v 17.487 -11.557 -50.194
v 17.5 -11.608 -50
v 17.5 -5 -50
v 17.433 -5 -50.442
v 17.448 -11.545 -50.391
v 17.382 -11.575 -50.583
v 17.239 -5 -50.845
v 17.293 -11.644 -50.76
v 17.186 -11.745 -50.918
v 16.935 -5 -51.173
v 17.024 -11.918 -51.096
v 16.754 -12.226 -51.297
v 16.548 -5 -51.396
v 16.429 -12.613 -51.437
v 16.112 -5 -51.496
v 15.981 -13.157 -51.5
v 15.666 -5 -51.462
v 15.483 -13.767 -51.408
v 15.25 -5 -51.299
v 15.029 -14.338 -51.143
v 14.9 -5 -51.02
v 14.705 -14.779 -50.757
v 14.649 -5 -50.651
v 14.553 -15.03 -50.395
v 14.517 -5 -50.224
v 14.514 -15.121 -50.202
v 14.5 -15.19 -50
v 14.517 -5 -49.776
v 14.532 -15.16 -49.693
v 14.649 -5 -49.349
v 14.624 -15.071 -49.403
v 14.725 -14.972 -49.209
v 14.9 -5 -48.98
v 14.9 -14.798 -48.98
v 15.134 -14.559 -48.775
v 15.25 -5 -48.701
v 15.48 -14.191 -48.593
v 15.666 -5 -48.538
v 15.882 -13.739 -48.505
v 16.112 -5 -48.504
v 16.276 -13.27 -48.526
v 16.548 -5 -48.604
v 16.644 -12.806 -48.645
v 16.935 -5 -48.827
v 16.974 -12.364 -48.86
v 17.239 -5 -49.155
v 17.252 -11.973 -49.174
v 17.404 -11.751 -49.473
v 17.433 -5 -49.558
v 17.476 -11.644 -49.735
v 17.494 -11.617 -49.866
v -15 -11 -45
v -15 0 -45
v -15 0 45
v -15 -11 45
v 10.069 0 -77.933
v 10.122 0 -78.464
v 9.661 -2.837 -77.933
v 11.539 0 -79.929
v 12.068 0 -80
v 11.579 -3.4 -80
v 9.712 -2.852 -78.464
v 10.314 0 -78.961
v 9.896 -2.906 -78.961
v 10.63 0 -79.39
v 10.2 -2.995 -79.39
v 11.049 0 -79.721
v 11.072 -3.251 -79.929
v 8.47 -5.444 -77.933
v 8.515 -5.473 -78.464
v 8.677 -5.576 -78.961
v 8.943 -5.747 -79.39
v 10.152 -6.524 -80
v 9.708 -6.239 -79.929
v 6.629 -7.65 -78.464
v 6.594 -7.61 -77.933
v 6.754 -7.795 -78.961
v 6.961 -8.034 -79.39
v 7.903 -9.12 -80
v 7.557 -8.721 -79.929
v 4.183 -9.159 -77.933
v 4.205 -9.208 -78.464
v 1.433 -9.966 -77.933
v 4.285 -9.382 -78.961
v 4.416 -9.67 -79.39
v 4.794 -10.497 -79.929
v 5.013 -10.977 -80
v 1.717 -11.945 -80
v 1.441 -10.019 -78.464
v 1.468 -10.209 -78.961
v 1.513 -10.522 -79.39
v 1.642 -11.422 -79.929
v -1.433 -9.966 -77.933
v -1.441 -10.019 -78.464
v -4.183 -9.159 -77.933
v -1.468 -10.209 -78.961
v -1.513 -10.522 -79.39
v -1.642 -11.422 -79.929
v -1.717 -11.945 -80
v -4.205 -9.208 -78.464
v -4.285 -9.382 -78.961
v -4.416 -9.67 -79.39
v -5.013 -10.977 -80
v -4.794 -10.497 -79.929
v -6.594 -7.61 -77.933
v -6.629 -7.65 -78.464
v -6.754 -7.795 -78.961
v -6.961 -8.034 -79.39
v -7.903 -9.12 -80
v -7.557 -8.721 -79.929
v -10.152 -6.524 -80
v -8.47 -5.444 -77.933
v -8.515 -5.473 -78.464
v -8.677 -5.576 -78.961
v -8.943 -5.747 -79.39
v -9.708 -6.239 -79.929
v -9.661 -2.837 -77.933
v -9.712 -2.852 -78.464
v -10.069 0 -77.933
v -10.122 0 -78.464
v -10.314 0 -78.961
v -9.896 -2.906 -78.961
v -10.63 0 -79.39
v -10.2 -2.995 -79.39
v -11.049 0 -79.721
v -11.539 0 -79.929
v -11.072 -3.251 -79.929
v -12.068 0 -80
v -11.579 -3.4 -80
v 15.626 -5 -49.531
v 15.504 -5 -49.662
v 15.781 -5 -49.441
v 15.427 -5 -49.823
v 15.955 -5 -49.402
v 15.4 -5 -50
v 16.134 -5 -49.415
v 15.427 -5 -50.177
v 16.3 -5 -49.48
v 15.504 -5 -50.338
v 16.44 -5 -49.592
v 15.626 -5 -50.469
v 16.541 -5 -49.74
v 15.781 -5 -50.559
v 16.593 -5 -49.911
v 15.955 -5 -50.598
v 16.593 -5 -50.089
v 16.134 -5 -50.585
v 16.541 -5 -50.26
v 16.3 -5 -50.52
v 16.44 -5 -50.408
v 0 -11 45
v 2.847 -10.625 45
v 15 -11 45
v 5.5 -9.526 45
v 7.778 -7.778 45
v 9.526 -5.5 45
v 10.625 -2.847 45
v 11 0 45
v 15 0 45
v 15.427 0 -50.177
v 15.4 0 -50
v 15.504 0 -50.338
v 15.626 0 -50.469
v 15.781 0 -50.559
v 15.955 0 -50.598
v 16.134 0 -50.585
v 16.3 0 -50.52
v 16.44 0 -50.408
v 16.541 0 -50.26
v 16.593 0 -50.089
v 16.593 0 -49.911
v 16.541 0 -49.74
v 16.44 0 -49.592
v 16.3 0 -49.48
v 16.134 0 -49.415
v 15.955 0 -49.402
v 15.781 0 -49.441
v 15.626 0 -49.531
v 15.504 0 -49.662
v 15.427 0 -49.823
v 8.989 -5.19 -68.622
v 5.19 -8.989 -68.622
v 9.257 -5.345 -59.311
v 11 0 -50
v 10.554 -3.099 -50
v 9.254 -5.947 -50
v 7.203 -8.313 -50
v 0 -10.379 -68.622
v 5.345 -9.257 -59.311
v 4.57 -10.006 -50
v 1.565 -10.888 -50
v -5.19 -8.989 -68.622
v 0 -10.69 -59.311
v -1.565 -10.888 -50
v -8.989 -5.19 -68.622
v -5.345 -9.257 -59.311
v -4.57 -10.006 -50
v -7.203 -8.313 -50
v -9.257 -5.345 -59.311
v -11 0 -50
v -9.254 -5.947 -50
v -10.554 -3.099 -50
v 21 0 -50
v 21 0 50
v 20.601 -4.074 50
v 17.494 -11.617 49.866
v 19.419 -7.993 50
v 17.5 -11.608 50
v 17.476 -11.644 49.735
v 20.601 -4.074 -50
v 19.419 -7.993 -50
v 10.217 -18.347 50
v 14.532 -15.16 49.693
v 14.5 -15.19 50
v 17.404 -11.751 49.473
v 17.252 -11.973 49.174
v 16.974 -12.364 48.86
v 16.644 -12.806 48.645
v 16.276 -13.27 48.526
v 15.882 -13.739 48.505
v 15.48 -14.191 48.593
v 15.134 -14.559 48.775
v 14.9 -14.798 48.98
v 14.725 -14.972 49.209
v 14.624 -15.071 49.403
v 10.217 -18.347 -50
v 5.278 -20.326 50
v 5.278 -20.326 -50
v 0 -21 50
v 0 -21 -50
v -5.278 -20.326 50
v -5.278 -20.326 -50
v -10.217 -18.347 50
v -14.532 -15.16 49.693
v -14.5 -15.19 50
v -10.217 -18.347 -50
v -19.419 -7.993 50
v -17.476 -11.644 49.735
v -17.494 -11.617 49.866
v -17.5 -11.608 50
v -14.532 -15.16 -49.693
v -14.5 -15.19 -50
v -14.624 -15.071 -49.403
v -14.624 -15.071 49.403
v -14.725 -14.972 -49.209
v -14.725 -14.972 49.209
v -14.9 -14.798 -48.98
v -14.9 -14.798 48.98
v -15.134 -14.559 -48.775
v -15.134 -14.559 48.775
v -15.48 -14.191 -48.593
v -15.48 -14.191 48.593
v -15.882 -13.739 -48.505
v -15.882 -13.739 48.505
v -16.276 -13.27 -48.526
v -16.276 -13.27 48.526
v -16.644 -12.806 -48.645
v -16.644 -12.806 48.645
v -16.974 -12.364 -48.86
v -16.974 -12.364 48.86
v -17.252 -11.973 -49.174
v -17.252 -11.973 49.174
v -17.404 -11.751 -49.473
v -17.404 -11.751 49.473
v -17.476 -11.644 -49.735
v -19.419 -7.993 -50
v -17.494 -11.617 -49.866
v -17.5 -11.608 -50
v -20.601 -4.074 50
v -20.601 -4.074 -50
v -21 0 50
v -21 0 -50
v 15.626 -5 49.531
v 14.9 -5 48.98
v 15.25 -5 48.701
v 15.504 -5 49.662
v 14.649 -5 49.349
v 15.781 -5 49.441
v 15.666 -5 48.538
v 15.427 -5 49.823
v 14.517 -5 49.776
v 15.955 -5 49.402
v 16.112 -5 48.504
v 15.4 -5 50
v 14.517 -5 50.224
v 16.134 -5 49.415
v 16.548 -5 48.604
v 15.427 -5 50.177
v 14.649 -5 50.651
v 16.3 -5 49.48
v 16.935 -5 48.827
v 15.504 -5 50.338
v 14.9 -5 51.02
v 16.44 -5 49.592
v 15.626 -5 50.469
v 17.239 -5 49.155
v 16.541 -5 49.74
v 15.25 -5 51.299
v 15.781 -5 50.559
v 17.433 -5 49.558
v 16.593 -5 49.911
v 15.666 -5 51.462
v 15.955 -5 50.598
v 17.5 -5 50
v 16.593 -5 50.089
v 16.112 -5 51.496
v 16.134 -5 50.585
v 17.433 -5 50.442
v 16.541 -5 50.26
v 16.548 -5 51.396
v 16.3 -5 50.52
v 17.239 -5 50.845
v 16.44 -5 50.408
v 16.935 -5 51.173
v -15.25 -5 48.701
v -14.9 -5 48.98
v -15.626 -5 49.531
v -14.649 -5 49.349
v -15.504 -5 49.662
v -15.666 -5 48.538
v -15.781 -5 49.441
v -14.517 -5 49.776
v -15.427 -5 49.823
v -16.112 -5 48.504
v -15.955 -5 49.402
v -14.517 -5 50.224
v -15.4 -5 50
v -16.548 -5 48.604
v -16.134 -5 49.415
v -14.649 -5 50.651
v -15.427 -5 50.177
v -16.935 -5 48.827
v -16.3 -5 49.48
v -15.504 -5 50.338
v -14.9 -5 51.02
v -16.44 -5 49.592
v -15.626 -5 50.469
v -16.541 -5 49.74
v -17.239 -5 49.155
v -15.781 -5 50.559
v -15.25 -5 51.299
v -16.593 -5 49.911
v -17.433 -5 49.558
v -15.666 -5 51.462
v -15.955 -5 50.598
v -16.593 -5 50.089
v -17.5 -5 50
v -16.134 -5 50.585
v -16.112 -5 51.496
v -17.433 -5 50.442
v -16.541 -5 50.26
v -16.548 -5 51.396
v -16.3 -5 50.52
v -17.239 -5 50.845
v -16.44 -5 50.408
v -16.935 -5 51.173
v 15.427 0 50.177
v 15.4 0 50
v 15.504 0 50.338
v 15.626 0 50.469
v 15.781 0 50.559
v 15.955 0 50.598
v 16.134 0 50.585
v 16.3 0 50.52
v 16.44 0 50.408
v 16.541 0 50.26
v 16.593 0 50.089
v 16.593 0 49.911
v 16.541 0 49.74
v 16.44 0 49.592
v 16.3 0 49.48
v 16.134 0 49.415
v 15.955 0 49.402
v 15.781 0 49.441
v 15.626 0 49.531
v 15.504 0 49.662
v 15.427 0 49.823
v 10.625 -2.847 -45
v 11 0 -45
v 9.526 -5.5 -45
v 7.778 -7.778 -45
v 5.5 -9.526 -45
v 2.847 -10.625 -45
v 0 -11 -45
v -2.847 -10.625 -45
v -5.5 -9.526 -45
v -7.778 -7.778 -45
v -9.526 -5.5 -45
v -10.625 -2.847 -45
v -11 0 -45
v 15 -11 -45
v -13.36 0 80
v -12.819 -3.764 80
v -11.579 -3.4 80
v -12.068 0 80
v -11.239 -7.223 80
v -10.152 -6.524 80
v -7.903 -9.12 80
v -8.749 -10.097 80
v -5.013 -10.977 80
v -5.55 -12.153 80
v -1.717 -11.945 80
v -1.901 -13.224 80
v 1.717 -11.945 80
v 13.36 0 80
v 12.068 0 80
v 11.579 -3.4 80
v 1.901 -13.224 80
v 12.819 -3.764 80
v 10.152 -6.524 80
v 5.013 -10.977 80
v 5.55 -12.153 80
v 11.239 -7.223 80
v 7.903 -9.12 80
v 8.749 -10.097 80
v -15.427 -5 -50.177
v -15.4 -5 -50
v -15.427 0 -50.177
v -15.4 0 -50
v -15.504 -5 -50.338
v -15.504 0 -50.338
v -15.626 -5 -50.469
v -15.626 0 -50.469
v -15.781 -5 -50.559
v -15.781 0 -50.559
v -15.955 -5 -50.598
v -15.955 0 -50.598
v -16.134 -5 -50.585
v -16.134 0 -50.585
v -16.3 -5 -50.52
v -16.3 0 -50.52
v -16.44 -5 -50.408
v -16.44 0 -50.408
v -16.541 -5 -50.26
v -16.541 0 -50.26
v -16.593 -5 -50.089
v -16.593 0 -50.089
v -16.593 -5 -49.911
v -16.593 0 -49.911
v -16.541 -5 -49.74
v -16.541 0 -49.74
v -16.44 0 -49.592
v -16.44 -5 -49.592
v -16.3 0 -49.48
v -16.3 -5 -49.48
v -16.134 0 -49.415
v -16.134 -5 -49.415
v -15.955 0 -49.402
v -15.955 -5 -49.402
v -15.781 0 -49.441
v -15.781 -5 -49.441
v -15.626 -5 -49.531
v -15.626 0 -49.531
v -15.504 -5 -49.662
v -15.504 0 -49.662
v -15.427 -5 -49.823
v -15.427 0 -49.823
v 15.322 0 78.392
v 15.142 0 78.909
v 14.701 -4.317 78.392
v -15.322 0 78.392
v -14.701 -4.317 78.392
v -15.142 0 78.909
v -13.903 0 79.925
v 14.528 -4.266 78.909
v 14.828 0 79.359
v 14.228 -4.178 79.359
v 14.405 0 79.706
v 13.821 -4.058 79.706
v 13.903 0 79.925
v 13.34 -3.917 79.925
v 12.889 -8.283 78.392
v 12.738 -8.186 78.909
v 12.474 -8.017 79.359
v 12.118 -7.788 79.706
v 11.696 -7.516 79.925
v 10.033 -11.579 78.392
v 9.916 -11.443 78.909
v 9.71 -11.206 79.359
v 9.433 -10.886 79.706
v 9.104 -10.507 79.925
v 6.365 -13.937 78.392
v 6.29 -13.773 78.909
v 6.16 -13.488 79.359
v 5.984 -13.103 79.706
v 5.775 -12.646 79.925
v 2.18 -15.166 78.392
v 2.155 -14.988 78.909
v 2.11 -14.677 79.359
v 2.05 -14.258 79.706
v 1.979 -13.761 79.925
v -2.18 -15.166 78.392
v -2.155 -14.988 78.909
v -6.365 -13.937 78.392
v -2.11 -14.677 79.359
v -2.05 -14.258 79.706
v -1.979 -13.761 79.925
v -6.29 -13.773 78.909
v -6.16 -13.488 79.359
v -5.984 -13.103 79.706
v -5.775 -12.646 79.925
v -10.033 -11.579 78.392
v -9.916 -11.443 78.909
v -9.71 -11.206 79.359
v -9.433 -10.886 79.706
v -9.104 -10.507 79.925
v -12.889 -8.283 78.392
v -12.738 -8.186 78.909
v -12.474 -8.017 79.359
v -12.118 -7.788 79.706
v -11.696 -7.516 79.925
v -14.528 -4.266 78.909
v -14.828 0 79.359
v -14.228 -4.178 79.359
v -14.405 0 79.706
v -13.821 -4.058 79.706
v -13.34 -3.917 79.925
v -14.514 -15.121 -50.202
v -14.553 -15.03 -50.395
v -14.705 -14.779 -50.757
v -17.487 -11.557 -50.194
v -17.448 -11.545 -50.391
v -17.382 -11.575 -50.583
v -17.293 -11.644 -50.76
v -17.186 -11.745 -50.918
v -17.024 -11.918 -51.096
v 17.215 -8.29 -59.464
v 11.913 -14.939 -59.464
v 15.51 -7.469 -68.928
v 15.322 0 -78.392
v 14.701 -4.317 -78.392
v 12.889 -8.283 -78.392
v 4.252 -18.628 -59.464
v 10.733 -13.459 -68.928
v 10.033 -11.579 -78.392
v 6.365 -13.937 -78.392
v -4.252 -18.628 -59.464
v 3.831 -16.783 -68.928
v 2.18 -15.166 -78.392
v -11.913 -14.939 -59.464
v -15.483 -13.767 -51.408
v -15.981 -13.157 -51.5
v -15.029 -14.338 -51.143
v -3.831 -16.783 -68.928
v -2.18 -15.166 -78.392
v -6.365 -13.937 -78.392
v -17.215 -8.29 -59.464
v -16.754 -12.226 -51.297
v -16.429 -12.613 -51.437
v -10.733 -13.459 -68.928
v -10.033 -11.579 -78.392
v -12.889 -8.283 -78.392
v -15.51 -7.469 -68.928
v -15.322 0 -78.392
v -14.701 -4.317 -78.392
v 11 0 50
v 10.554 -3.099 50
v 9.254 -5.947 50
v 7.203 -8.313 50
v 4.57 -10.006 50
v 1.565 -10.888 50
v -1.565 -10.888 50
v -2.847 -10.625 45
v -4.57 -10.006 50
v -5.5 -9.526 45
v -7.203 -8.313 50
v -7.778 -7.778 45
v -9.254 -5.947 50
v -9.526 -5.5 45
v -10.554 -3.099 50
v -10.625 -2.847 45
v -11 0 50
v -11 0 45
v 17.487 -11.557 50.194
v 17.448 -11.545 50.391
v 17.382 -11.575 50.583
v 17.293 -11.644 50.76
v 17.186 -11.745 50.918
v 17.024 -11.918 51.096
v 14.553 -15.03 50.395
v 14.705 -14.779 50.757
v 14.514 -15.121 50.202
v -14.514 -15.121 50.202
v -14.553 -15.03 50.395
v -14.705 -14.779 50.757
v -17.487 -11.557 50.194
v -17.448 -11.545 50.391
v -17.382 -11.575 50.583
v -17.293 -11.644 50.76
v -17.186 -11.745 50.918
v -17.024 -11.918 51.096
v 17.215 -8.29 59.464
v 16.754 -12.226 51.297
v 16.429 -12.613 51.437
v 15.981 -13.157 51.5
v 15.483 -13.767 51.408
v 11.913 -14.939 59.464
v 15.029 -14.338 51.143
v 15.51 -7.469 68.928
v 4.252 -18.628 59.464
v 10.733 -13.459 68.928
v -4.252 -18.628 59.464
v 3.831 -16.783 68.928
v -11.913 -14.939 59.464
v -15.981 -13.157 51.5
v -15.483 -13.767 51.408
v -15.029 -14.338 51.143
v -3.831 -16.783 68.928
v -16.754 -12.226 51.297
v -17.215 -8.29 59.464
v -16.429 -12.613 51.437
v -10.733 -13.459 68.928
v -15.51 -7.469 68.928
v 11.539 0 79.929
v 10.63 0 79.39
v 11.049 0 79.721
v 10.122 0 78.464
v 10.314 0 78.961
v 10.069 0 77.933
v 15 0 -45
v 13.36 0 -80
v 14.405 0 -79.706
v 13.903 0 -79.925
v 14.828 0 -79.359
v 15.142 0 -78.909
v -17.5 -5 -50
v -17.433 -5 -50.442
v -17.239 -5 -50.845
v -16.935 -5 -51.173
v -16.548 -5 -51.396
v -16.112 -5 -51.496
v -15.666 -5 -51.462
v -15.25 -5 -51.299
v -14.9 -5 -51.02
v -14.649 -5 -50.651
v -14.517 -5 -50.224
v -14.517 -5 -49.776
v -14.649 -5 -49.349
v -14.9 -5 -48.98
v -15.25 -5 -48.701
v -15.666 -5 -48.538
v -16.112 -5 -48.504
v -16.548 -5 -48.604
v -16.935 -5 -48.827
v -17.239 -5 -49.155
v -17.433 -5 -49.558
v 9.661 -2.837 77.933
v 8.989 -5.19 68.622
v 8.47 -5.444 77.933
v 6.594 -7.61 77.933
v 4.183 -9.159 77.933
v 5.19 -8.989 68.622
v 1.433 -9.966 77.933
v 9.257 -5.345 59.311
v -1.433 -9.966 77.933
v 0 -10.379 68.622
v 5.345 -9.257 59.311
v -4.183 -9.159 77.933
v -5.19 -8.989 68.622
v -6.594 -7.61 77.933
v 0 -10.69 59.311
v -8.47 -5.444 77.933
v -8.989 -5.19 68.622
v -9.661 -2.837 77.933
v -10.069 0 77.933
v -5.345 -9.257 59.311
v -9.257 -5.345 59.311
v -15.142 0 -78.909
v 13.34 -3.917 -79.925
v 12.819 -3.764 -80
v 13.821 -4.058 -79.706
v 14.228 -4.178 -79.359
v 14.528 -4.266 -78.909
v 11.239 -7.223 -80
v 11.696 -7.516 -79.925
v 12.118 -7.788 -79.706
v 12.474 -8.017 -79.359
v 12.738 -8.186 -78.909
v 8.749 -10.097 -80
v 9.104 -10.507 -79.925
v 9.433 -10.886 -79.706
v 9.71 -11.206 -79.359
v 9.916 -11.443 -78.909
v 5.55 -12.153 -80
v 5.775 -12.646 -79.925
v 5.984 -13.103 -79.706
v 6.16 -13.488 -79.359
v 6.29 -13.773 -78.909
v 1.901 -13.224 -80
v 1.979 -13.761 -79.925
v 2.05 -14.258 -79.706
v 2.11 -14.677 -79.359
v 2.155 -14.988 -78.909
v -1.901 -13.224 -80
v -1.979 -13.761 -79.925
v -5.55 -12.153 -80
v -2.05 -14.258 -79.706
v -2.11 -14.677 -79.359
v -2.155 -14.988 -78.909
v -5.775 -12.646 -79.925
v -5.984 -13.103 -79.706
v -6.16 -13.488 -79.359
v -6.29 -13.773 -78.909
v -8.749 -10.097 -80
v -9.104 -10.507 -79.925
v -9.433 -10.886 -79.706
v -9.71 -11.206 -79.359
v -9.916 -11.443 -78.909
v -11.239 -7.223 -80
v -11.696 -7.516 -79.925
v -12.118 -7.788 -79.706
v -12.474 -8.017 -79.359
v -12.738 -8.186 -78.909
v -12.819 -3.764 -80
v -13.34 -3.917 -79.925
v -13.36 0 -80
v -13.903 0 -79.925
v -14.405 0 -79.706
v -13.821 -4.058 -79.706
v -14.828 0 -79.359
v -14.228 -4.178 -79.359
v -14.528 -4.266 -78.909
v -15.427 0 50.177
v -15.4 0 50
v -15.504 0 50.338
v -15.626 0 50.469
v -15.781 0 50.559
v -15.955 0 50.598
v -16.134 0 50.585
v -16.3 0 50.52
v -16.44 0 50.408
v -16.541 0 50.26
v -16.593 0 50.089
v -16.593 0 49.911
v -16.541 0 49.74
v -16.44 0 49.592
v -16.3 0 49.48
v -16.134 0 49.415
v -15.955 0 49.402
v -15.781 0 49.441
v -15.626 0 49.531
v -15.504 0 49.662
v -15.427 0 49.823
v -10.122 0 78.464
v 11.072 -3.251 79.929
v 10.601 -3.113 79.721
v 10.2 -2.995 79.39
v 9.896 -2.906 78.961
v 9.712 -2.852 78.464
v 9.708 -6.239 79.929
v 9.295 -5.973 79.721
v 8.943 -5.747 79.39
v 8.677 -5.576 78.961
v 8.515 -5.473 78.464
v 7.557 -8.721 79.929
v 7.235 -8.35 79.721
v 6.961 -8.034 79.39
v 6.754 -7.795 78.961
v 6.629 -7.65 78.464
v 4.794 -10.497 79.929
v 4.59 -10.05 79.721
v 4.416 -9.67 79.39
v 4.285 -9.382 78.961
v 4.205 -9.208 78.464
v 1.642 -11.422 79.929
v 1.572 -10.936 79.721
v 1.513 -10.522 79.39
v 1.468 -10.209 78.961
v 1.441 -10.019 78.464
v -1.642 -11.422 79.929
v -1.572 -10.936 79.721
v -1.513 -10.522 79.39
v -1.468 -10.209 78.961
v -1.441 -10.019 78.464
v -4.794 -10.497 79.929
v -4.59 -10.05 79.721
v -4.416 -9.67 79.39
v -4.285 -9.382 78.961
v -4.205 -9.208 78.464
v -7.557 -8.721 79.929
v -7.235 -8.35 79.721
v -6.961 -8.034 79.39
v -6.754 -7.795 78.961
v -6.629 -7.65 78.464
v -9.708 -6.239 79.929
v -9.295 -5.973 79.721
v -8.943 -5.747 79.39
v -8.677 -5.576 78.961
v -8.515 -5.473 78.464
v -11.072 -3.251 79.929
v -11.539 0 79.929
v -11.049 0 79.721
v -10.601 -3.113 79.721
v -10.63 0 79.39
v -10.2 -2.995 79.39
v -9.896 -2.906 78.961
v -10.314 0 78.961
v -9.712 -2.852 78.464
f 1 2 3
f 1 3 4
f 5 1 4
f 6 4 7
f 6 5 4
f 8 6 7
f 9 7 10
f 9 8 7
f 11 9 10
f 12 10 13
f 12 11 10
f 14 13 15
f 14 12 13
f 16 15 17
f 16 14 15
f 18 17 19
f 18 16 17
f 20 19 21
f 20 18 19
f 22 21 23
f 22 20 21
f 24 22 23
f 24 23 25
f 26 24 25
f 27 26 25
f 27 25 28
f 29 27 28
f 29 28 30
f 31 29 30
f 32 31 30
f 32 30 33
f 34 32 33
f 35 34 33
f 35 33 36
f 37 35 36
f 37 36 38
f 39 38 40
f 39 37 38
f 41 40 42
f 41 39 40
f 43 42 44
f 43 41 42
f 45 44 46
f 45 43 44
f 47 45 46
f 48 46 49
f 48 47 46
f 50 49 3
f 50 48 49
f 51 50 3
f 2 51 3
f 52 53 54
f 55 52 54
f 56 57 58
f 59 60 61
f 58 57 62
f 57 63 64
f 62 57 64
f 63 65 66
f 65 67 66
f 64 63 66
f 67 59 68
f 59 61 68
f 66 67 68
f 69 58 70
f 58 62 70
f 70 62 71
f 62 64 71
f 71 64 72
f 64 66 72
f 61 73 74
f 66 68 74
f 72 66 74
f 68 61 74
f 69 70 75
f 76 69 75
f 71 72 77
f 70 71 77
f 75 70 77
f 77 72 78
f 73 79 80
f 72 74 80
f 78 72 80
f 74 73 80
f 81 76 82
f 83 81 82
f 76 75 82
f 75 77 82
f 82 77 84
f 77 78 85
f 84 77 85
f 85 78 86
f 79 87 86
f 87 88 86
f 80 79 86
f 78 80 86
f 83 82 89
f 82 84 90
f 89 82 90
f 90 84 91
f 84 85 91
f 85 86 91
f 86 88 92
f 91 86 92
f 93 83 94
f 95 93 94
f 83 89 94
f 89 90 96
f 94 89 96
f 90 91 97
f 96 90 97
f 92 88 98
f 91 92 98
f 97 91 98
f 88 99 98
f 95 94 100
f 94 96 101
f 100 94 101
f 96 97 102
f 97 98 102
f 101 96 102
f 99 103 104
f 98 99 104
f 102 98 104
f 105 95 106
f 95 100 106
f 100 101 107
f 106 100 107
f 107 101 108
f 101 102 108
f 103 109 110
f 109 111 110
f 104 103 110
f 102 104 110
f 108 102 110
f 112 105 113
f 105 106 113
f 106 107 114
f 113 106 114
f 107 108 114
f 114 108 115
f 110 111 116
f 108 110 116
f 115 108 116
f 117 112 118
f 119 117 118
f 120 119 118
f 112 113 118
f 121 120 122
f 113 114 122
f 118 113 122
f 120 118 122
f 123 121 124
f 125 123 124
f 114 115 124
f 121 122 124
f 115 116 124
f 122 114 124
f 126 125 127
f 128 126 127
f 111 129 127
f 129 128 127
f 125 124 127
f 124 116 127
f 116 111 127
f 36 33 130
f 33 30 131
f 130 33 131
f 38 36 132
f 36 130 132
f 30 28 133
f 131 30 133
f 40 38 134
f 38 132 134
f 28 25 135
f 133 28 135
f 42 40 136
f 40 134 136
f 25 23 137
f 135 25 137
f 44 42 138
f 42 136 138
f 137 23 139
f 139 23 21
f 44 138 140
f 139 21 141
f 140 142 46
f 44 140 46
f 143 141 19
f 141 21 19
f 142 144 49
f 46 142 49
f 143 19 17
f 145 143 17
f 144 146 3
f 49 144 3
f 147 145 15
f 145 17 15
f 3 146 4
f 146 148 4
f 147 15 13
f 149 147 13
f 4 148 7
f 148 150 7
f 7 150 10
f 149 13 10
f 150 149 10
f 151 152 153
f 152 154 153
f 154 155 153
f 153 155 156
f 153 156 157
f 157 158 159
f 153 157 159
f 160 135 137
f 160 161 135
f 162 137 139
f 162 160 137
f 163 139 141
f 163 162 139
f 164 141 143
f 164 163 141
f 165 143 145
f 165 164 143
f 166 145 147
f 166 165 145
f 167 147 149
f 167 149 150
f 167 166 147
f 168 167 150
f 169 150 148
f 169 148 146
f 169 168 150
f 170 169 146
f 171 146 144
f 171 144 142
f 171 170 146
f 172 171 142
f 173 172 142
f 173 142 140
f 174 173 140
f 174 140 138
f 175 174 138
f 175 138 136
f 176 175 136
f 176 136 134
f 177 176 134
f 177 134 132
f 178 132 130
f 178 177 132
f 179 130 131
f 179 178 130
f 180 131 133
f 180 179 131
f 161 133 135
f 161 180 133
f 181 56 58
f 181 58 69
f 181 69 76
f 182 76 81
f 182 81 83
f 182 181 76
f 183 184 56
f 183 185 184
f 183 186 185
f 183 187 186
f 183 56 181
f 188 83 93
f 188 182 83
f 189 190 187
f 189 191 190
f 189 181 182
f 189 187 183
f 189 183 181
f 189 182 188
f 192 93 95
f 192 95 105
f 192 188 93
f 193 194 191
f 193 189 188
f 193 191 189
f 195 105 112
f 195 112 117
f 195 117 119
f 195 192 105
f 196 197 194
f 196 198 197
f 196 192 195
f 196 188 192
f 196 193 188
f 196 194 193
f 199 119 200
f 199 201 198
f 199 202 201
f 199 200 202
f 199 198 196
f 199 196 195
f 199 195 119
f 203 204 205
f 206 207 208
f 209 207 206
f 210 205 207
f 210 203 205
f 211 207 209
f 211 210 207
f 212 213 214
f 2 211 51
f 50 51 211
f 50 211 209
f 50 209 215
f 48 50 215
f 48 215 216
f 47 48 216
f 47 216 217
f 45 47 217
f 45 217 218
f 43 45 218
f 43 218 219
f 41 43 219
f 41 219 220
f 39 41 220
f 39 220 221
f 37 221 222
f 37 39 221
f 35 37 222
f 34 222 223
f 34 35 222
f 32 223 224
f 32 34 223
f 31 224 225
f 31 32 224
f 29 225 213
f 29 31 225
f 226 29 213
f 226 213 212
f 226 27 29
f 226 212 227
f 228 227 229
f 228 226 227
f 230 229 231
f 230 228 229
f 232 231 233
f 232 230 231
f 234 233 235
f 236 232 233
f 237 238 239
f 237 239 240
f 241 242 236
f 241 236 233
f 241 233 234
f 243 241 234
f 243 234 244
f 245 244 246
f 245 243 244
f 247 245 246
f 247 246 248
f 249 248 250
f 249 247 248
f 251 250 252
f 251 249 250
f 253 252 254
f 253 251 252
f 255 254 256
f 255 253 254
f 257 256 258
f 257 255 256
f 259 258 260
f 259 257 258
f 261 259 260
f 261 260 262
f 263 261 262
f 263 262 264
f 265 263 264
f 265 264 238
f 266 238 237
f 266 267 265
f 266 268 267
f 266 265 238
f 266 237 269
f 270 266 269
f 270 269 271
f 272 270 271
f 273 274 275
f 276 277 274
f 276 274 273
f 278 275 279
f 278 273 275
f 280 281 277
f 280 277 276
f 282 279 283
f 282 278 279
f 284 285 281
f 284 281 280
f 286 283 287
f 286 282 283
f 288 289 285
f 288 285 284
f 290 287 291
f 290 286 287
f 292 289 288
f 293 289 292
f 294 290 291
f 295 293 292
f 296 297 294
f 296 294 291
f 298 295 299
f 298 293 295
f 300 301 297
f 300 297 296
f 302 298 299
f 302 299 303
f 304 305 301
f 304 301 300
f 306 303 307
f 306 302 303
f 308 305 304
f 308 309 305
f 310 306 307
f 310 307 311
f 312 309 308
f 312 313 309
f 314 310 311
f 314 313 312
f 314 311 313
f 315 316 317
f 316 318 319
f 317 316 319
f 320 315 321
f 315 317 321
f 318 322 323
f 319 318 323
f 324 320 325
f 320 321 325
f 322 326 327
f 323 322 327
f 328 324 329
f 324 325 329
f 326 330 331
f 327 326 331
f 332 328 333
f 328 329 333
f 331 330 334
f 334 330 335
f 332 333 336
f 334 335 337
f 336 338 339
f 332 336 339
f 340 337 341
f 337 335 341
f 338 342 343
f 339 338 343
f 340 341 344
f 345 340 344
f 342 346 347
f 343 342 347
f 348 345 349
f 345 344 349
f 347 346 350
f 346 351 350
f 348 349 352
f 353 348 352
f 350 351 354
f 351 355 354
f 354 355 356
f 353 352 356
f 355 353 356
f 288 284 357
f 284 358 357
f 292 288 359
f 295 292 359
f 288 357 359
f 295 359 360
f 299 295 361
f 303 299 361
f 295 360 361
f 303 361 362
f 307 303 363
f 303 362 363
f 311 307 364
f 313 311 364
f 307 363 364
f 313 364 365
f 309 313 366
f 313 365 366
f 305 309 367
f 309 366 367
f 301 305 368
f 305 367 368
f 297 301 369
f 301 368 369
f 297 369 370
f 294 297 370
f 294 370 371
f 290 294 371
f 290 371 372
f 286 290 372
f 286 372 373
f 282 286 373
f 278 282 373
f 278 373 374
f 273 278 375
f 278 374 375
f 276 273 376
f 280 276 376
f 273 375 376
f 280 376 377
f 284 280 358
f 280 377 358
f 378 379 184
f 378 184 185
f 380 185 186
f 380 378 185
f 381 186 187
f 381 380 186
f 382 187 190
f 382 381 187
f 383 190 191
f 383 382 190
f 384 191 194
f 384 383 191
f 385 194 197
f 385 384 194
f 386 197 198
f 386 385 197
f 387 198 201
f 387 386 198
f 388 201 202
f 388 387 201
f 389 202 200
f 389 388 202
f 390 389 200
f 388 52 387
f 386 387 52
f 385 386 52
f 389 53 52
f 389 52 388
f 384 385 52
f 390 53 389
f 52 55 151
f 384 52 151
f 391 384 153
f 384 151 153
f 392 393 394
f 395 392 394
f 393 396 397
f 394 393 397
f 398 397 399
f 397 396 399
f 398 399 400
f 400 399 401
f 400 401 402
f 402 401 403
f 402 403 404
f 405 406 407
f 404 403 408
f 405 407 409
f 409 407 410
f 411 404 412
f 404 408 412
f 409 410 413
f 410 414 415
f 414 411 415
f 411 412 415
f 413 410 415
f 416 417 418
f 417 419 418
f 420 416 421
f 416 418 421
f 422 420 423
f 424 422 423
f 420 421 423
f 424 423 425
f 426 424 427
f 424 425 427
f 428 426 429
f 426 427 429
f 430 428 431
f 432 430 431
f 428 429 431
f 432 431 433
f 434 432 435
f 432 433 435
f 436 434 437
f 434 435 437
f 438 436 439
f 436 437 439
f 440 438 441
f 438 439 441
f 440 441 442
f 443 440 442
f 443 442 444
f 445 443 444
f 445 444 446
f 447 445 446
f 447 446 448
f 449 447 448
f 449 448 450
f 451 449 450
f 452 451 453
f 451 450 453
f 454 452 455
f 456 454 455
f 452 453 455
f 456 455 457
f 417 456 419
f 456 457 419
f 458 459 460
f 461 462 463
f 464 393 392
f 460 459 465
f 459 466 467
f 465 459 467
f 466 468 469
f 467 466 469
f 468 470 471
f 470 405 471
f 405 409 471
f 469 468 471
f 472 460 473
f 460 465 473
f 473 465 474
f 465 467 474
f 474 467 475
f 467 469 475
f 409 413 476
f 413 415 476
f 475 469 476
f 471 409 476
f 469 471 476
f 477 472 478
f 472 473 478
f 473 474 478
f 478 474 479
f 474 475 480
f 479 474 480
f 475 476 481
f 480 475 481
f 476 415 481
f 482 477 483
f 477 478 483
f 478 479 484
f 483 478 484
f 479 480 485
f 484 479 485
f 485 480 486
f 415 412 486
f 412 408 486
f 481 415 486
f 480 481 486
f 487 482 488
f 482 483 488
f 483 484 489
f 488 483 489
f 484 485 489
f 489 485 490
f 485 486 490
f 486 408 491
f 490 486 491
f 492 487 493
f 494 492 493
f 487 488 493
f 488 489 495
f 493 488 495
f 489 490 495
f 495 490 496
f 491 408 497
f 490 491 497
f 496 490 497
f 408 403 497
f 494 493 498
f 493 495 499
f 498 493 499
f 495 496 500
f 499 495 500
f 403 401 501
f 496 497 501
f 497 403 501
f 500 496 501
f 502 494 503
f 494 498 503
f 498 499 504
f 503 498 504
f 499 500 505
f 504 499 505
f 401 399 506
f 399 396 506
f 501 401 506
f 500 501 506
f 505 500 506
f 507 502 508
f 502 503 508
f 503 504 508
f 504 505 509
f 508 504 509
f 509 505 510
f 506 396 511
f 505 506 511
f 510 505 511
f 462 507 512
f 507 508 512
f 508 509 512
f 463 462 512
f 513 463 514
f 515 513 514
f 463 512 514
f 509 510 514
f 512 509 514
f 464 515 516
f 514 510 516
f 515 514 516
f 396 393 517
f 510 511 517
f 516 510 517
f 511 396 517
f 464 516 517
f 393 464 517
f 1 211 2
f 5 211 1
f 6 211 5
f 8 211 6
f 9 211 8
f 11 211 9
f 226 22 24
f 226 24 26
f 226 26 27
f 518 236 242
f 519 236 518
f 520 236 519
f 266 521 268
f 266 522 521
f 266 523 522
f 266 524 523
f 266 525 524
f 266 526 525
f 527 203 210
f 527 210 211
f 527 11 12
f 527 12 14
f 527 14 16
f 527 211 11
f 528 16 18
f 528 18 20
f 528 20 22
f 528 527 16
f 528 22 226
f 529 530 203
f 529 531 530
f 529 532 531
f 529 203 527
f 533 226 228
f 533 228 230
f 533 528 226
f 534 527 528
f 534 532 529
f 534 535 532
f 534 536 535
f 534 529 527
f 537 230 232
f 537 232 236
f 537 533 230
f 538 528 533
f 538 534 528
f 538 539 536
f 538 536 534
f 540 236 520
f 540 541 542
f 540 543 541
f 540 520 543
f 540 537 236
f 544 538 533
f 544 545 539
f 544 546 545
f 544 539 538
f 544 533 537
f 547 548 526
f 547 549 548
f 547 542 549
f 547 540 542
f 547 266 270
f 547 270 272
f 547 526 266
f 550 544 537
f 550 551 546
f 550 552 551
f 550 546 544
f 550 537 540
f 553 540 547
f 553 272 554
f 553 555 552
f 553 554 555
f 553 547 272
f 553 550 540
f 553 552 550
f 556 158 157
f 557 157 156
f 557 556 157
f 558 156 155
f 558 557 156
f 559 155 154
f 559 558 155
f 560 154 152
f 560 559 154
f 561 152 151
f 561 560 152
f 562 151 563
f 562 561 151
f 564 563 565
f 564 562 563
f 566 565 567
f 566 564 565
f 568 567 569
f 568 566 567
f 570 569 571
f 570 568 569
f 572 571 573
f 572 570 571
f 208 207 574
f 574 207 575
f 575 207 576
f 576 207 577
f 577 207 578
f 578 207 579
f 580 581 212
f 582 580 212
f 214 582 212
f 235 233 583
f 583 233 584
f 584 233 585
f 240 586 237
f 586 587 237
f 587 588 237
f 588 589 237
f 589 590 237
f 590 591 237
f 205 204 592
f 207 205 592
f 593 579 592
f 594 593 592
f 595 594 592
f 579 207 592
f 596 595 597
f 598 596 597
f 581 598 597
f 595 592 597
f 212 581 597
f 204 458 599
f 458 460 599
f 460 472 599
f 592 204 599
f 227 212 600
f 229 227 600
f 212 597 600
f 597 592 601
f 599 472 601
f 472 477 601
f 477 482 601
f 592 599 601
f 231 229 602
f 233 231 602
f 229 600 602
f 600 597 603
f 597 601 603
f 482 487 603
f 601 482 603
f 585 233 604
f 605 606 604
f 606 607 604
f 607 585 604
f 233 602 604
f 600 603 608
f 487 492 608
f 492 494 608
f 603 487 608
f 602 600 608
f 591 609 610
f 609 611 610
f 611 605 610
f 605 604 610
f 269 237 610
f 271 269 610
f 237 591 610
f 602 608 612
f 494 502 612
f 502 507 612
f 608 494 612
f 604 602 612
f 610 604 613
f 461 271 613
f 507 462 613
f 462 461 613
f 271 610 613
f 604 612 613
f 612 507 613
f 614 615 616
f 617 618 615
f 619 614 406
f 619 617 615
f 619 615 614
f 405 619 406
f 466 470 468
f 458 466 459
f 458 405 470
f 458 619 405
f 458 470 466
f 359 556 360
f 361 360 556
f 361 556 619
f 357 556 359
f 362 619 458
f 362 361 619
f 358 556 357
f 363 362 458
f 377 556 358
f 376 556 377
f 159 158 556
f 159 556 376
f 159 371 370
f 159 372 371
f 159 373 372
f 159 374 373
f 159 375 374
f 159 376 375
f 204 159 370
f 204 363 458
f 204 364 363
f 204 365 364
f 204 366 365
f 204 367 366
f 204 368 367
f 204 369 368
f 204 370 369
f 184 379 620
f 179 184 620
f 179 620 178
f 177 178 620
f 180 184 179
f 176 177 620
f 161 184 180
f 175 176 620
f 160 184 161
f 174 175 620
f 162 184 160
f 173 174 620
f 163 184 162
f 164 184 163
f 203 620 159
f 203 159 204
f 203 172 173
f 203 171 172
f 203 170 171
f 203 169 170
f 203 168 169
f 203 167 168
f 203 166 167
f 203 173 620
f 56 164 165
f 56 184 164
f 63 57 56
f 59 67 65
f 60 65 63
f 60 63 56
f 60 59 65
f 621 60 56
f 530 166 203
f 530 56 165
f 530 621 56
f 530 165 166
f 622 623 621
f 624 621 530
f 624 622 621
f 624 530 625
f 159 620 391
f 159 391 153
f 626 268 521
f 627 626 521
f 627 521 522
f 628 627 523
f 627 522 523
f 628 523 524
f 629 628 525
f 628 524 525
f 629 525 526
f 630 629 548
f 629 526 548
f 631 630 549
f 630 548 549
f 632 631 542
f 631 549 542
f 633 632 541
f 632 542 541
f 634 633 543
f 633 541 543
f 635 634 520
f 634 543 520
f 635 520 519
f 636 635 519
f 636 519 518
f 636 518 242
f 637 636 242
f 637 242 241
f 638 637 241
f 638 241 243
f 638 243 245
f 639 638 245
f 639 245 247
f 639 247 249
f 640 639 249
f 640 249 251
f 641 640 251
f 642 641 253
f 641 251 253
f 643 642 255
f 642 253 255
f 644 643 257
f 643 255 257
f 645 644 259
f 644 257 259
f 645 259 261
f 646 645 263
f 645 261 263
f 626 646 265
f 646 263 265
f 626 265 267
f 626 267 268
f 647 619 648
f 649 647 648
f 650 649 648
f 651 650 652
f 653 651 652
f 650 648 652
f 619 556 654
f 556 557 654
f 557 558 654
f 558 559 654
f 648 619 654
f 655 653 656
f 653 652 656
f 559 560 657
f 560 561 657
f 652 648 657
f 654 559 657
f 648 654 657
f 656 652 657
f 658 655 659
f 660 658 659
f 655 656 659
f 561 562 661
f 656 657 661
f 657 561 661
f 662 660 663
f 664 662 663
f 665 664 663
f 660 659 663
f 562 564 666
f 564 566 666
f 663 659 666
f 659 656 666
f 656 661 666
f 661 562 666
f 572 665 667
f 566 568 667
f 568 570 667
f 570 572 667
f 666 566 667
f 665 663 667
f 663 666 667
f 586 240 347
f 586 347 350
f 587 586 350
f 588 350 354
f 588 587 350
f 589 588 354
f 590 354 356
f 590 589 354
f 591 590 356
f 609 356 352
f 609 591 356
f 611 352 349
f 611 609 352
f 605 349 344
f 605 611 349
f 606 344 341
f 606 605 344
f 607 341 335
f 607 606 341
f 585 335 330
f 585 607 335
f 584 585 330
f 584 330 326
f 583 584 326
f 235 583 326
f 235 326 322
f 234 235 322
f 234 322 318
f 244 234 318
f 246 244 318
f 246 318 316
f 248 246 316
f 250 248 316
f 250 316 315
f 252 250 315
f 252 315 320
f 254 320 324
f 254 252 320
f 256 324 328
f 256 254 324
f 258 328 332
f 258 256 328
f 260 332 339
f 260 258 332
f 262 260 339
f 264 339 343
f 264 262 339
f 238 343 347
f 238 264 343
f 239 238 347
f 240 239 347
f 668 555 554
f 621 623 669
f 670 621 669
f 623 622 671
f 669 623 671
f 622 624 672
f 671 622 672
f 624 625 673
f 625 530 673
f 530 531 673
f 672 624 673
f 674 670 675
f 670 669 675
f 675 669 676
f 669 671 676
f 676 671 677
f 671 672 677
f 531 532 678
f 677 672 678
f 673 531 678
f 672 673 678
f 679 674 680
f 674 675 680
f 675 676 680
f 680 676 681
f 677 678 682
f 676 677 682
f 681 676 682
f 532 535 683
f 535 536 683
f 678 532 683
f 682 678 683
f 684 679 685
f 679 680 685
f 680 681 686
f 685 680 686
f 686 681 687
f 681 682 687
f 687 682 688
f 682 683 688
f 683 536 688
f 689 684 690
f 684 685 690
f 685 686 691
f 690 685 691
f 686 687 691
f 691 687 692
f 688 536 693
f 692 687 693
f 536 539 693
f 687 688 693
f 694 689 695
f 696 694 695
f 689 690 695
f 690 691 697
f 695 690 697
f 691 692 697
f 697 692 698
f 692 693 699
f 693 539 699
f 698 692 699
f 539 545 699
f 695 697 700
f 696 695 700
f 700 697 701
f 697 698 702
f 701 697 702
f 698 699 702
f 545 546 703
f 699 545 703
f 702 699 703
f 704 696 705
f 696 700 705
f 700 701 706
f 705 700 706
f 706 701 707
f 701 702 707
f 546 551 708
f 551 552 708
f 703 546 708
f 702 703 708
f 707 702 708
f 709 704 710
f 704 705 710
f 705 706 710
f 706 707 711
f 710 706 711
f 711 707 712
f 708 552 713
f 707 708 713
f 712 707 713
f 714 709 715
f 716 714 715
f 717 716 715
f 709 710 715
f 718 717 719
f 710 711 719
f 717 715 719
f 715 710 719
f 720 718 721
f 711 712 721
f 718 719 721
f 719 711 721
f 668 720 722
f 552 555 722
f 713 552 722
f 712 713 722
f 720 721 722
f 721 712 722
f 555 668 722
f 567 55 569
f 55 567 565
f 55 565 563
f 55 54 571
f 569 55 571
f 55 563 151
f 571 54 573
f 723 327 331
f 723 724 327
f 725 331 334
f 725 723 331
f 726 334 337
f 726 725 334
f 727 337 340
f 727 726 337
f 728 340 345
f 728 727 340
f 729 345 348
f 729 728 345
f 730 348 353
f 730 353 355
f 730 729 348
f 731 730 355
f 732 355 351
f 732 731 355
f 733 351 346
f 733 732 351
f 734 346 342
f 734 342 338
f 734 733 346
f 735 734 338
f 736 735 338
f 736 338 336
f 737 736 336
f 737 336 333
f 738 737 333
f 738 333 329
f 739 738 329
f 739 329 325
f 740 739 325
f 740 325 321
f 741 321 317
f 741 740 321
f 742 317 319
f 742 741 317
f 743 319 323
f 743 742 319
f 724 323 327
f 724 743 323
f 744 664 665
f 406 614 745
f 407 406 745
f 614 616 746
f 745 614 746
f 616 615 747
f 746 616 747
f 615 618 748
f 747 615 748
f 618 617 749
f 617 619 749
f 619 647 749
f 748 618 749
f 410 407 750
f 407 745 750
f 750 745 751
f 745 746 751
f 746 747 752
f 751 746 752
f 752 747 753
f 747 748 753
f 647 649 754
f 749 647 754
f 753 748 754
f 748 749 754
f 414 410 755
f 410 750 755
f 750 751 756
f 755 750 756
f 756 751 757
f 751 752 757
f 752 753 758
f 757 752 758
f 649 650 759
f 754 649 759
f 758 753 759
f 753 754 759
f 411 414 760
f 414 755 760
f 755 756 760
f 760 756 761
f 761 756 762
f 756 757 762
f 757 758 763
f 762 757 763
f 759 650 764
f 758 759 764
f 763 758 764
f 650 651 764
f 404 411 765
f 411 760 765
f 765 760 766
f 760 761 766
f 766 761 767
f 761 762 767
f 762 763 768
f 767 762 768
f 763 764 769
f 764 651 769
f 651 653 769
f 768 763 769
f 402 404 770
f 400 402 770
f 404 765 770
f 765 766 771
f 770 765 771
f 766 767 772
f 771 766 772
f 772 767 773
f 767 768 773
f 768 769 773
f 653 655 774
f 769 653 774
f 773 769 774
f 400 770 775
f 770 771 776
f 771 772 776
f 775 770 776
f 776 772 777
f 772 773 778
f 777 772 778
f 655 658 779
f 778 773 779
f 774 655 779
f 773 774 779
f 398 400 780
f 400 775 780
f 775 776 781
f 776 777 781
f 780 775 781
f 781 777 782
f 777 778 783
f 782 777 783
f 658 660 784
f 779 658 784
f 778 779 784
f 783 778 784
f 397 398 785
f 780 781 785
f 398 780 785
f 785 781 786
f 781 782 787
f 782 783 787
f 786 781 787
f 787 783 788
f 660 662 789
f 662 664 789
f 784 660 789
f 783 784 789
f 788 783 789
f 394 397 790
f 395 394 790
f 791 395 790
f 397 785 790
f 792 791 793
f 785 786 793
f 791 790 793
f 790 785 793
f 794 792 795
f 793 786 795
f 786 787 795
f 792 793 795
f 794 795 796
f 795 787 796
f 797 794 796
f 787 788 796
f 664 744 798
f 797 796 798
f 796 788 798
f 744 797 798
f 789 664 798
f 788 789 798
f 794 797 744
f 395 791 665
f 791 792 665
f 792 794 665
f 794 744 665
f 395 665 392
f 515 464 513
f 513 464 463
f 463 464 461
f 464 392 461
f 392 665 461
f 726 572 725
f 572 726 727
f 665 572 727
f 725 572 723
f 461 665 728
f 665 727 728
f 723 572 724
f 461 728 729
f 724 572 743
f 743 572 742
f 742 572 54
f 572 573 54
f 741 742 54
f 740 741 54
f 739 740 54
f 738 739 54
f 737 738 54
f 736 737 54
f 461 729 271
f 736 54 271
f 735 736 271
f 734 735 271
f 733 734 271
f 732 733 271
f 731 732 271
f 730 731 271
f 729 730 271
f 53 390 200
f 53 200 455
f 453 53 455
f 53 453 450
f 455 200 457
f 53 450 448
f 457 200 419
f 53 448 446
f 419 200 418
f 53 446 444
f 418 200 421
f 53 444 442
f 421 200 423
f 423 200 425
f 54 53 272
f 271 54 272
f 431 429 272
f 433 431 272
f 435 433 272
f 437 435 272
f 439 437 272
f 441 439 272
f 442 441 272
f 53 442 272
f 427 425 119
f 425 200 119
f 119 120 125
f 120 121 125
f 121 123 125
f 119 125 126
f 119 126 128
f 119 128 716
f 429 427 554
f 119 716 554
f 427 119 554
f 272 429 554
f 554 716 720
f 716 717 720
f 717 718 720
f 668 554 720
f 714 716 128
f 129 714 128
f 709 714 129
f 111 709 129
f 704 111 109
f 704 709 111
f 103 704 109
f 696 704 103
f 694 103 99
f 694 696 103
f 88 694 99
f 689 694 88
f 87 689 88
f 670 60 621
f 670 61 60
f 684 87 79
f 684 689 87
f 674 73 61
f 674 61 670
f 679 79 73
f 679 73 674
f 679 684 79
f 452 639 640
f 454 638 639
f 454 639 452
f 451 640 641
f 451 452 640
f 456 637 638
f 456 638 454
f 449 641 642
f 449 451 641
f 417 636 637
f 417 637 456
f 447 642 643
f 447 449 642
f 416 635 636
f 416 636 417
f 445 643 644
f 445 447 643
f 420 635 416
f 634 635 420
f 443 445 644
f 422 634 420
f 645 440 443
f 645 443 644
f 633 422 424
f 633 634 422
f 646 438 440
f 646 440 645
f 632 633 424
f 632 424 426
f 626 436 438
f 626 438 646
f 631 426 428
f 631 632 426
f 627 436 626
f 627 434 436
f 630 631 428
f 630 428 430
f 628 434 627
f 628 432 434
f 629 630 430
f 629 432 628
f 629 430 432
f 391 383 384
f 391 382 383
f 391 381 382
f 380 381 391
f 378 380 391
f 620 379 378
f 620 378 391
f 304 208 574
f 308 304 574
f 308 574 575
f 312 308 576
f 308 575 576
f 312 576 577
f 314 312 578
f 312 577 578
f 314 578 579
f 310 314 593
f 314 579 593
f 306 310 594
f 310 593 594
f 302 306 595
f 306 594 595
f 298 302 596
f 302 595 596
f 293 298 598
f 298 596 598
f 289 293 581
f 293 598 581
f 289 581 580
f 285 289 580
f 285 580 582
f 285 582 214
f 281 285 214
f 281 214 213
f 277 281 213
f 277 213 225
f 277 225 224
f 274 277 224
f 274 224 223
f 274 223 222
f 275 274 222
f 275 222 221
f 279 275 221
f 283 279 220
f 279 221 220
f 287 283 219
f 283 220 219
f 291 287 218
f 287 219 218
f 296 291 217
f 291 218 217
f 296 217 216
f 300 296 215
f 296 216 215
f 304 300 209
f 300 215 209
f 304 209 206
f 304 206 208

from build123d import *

# Parameters (mm, degrees)
REVOLUTION_ANGLE   = -180
SKETCH002_W        = 30
SKETCH002_H        = 90
POCKET_DEPTH       = 11
HOLE_D             = 1.2
HOLE_DEPTH         = 32
HOLE_CBORE_D       = 3
HOLE_CBORE_DEPTH   = 15
POLARPATTERN_COUNT = 4
FILLET_R           = 2


with BuildPart() as part:
    # Sketch → Revolution (revolve)
    with BuildSketch(Plane.XZ):
        Polygon((10, 80), (11, 50), (11, 0), (21, 0), (21, 50), (15, 80), align=None)
    revolution = revolve(axis=Axis((0, 0, 0), (0, 0, 1)), revolution_arc=REVOLUTION_ANGLE)

    # Mirrored003: Revolution across XY
    add(revolution.mirror(Plane.XY))

    # Sketch002 → Pocket (cut)
    with BuildSketch(Plane.XZ):
        Rectangle(SKETCH002_W, SKETCH002_H)
    extrude(amount=POCKET_DEPTH, mode=Mode.SUBTRACT)

    # Hole
    with Locations(Plane.XZ.offset(20)):
        with Locations((16, 50)):
            hole = CounterBoreHole(HOLE_D / 2, HOLE_CBORE_D / 2, HOLE_CBORE_DEPTH, depth=HOLE_DEPTH)

    # PolarPattern: Hole ×4 about axis
    polarpattern_axis = Axis((0, 0, 0), (0, 1, 0))
    for i in range(1, POLARPATTERN_COUNT):
        add(hole.rotate(polarpattern_axis, i * 360 / POLARPATTERN_COUNT), mode=Mode.SUBTRACT)

    # Mirrored: Hole across XY
    add(hole.mirror(Plane.XY), mode=Mode.SUBTRACT)

    # Mirrored004: Hole across Sketch003 V_Axis
    add(hole.mirror(Plane(origin=(0, -20, 0), x_dir=(0, -1, 0), z_dir=(1, 0, 0))), mode=Mode.SUBTRACT)

    # Fillet
    fillet_edges = [part.edges().sort_by_distance(p)[0] for p in [
        (0, -10, 80),
        (0, -15, 80),
        (0, -10, -80),
        (0, -15, -80),
    ]]
    fillet(fillet_edges, radius=FILLET_R)


solid = part.part
